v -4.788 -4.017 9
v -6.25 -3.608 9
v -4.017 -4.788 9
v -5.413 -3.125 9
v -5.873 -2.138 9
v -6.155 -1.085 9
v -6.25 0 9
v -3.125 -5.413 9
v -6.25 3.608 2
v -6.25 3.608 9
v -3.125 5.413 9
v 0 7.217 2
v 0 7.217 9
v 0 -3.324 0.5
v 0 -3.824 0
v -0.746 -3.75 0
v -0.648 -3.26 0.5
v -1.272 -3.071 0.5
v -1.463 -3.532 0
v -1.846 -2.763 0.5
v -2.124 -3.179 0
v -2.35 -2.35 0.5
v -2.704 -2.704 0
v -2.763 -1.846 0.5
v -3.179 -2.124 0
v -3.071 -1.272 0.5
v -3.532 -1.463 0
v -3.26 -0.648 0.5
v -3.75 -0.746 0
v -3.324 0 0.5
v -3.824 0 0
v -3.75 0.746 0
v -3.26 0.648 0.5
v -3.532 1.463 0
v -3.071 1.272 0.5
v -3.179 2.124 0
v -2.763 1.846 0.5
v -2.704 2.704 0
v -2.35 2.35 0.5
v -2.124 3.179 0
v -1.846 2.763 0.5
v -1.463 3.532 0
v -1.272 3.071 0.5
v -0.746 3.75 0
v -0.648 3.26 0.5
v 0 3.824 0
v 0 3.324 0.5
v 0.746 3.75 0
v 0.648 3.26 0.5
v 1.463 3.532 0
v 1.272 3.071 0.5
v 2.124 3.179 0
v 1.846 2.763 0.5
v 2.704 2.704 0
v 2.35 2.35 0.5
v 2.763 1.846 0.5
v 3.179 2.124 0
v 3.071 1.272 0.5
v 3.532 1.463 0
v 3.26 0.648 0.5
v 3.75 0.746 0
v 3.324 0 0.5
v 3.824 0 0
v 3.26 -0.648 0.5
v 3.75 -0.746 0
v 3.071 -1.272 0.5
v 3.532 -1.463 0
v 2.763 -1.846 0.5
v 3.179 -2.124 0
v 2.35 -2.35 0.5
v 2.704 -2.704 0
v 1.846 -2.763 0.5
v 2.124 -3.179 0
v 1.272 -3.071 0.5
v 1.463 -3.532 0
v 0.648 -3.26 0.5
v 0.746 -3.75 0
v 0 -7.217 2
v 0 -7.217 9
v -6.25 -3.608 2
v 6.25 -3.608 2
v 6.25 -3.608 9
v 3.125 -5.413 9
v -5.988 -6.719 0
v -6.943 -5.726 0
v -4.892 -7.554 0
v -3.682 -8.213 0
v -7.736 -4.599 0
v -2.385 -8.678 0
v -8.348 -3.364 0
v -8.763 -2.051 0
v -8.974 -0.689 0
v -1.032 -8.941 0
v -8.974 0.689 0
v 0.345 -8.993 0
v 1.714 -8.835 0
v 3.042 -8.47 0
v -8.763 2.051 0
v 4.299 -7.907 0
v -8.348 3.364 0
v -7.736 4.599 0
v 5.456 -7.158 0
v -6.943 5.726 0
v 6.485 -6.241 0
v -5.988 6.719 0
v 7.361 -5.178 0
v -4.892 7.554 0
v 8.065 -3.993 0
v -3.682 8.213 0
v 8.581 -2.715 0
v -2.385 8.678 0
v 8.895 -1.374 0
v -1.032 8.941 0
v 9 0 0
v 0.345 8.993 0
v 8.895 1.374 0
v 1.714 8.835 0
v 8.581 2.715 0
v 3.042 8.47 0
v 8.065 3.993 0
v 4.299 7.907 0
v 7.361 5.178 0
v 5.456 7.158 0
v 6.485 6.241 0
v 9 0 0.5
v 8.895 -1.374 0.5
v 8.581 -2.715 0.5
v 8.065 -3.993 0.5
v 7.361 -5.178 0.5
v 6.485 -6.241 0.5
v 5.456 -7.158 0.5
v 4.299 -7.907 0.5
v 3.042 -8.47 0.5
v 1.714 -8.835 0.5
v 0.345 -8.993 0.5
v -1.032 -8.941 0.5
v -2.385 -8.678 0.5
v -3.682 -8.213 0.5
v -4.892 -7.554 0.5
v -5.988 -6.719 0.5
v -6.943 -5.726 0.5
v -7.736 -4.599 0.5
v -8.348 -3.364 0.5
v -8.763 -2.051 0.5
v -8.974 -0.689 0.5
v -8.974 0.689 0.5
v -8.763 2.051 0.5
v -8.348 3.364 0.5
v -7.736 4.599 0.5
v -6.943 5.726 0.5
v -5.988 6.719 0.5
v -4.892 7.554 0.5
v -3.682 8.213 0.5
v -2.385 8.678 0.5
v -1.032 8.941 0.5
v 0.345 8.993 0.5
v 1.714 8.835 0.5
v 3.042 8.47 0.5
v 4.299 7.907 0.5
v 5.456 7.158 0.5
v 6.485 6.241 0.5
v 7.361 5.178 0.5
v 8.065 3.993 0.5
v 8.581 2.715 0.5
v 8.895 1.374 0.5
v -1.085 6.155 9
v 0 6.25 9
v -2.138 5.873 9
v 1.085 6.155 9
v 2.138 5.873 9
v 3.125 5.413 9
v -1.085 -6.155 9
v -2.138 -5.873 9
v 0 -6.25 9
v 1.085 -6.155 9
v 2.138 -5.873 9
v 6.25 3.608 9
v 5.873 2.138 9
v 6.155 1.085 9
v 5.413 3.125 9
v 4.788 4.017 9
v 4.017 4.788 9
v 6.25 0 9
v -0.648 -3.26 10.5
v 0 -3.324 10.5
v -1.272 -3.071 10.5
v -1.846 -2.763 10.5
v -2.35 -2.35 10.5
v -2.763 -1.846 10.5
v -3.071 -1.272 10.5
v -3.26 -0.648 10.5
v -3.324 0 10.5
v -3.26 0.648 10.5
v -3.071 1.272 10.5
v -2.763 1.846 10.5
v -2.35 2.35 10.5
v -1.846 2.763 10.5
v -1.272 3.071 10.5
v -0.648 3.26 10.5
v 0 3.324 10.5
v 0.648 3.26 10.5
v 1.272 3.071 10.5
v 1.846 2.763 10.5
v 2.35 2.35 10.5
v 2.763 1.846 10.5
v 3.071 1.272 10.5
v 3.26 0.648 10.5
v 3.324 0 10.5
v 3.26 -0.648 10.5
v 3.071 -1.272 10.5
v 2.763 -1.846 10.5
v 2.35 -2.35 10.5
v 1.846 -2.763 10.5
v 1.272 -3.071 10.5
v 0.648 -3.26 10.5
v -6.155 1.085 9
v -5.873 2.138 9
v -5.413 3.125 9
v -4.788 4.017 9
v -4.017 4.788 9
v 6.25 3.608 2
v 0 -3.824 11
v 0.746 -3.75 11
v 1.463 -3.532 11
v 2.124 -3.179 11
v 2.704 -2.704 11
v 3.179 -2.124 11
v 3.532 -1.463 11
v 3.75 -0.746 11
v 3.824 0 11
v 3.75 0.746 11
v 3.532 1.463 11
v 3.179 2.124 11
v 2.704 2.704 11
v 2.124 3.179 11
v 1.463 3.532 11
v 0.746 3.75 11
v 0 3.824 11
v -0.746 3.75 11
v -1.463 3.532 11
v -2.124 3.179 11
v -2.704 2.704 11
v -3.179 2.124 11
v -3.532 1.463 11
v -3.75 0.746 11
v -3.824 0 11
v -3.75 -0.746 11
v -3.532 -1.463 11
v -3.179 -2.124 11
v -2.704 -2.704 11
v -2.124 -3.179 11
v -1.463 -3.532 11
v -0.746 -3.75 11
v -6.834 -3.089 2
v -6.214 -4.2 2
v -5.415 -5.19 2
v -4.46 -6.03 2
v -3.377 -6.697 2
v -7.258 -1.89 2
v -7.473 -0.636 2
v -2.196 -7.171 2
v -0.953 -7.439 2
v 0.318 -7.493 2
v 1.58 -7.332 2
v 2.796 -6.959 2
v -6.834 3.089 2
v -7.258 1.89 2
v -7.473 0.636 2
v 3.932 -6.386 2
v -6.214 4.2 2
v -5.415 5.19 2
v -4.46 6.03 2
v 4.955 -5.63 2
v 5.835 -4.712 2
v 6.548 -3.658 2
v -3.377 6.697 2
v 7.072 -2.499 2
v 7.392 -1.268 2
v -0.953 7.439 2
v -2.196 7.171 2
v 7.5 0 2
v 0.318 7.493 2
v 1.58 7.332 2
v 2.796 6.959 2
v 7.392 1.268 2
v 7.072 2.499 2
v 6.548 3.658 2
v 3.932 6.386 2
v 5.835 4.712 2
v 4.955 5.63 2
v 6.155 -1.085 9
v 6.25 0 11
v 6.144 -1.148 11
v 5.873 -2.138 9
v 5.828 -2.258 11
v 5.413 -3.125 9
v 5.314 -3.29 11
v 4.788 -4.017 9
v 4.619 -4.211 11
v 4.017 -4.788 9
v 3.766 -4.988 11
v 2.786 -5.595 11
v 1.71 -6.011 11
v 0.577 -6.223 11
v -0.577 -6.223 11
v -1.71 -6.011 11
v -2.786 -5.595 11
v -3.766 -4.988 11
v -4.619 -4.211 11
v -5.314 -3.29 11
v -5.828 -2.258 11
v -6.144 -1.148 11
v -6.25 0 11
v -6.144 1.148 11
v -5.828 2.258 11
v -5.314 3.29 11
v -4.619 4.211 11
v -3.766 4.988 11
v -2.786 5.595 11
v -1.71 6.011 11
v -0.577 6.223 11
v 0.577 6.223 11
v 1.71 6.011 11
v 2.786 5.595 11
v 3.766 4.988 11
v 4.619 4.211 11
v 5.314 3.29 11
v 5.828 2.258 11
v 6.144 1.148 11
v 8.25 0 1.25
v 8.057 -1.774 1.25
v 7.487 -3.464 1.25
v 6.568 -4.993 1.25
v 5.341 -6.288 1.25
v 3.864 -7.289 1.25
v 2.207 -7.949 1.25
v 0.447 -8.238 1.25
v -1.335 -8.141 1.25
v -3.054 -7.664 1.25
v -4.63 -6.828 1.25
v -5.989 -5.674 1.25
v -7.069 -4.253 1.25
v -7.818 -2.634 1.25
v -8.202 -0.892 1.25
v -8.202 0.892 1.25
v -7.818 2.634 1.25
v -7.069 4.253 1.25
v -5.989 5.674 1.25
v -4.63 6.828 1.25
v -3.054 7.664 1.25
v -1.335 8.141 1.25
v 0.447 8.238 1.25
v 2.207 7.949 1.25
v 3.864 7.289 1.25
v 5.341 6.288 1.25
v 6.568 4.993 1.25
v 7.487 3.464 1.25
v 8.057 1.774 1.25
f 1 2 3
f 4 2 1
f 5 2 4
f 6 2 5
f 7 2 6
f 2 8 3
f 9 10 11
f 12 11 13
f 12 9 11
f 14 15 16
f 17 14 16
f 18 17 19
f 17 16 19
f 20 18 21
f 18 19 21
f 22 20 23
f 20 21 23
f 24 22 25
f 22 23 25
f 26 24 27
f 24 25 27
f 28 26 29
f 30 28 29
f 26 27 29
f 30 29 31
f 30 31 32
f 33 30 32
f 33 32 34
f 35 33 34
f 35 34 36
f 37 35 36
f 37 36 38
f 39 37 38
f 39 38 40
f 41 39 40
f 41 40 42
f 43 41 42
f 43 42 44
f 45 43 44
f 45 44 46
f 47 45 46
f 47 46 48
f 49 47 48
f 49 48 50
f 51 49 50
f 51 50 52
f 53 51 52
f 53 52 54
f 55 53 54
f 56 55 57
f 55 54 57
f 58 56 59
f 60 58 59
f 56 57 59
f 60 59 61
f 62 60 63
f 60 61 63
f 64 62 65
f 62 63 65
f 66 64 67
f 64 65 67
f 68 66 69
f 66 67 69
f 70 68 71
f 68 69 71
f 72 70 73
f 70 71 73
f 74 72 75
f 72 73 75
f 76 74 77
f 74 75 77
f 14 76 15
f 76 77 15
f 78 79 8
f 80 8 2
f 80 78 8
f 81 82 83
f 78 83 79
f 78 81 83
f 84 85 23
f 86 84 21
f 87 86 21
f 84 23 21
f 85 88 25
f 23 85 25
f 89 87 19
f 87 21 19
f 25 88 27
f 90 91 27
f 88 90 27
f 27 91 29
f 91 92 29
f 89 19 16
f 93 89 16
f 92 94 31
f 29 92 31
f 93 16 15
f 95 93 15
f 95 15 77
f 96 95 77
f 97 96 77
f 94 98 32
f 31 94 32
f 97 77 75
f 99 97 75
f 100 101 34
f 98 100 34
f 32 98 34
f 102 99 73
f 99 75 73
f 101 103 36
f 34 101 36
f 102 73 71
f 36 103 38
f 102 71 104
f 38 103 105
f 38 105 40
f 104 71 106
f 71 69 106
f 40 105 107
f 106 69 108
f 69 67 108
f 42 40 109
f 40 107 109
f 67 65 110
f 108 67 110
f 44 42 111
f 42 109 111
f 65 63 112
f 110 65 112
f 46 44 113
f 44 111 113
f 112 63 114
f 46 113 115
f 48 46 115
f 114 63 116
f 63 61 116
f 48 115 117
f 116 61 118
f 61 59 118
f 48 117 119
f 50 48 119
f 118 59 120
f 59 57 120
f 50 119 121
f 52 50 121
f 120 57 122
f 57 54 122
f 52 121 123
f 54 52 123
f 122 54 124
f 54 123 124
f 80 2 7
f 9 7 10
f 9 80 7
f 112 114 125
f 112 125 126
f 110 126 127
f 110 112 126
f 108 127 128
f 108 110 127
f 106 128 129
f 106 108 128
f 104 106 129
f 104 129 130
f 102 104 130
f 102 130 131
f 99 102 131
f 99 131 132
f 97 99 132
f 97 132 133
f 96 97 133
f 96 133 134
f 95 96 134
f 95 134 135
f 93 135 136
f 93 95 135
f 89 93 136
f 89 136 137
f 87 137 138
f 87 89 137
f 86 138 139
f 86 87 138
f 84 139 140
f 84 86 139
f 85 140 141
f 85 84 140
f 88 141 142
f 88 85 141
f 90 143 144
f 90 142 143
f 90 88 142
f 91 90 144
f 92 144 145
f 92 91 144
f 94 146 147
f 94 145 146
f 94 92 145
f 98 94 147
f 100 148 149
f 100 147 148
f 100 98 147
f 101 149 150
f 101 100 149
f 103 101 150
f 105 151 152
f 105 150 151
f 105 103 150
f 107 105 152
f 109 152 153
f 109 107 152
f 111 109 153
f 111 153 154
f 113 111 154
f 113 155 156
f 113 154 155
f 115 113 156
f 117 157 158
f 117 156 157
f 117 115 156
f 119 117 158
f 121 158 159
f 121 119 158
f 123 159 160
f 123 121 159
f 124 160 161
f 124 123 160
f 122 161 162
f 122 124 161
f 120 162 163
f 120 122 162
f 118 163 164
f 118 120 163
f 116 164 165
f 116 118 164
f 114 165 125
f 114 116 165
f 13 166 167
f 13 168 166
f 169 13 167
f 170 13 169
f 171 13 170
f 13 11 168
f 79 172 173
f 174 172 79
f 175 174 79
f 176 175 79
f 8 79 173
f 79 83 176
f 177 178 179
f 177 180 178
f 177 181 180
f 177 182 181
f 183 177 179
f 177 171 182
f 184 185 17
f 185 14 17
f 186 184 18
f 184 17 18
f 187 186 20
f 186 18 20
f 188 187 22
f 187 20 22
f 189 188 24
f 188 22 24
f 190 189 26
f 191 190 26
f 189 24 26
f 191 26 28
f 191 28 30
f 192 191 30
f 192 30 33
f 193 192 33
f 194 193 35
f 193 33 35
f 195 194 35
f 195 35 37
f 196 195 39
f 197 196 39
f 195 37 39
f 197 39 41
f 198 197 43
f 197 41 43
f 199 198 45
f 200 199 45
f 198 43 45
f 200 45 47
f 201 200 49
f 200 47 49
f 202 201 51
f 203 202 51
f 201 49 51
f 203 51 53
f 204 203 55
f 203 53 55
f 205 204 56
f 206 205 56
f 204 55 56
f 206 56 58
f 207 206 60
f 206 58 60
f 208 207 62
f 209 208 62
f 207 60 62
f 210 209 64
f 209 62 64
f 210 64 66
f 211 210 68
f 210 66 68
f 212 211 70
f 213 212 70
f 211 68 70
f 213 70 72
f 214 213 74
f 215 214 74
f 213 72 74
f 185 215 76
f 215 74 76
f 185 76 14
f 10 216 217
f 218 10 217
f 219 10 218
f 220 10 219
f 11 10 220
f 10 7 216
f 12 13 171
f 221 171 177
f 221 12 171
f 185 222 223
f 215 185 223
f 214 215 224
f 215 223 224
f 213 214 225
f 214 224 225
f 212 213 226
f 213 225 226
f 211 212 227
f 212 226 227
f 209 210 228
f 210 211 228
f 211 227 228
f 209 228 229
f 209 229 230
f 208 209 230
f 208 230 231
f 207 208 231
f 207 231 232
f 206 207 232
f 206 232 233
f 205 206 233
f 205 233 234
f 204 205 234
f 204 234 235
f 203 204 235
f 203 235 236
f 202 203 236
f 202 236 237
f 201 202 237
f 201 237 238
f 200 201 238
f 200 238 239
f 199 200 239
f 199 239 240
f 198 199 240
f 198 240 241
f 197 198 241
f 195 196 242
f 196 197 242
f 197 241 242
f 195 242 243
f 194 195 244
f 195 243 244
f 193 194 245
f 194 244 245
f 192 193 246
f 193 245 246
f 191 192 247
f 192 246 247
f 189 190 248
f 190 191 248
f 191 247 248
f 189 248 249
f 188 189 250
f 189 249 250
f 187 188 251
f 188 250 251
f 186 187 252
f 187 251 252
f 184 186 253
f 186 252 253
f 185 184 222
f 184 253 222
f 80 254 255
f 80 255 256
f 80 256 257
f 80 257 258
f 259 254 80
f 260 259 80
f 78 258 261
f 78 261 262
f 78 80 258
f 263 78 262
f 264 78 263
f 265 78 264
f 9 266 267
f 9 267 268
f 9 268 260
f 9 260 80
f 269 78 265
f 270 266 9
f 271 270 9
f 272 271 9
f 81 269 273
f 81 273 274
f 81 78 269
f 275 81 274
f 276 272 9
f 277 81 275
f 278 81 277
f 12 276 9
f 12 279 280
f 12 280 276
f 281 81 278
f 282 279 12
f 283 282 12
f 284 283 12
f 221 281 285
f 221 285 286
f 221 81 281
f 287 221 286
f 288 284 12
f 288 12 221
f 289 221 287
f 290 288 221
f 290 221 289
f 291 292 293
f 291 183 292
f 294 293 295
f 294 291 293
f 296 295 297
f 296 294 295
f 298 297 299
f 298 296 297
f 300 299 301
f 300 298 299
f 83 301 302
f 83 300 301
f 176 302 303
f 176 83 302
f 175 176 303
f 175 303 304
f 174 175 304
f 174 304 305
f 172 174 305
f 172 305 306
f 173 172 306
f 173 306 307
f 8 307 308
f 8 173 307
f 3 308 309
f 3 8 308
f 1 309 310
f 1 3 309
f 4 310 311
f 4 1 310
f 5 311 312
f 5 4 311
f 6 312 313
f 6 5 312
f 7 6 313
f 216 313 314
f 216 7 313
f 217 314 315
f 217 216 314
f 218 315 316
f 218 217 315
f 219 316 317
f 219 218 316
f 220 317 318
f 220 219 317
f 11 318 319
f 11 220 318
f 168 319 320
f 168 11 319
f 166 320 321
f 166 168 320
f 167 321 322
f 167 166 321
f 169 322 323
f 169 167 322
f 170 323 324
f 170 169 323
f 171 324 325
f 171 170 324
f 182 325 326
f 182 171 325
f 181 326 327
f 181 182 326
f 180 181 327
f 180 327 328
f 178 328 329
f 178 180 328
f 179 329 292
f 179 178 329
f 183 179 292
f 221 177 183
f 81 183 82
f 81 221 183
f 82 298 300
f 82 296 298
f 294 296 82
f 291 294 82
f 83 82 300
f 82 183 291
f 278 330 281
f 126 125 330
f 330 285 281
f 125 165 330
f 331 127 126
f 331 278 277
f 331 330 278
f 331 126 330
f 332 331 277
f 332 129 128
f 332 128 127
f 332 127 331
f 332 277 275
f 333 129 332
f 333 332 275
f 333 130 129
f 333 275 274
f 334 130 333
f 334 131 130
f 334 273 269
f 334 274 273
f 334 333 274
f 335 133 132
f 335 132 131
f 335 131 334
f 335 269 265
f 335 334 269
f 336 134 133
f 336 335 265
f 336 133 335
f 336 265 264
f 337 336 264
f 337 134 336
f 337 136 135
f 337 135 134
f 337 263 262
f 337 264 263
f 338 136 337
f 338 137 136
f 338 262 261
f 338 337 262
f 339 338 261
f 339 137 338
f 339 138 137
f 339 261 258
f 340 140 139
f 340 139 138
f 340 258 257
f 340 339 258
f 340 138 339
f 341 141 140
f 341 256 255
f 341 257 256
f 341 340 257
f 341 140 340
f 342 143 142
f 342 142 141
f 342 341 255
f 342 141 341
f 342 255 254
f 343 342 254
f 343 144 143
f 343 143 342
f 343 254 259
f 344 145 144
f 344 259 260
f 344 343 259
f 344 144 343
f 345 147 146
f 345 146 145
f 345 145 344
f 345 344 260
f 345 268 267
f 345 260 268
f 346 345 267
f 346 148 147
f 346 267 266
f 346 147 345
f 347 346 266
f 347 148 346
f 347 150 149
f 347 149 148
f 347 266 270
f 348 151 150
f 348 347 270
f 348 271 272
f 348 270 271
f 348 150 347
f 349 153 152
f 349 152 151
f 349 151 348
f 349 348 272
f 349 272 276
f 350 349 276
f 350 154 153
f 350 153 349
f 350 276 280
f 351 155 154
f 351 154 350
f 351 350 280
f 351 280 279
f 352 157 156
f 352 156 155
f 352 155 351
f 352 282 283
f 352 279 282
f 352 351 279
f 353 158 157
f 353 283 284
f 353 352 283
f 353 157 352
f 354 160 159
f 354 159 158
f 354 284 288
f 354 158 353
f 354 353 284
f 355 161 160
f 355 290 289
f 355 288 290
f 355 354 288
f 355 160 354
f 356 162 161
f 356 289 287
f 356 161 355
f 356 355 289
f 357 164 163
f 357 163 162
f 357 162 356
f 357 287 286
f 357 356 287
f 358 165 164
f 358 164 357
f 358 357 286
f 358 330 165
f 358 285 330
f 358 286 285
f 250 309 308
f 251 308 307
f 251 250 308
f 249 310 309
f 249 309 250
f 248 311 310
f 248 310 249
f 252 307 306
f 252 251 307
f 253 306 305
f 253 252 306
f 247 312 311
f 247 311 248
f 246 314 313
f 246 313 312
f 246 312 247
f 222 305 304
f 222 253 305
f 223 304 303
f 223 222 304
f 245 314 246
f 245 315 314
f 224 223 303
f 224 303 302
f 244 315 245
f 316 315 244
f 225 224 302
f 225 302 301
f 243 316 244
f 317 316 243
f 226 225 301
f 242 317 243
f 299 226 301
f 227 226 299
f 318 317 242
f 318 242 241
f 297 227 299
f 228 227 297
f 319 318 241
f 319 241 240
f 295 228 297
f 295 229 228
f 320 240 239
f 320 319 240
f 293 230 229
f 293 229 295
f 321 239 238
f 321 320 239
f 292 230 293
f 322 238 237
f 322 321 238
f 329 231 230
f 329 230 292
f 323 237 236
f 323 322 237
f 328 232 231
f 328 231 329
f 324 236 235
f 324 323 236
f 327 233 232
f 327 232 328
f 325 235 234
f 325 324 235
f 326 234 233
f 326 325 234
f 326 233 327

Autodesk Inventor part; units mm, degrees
ref_plane "YZ Plane" through (0, 0, 0) normal (1, 0, 0) x (0, 1, 0)
ref_plane "XZ Plane" through (0, 0, 0) normal (0, 1, 0) x (-1, 0, 0)
ref_plane "XY Plane" through (0, 0, 0) normal (0, 0, 1) x (1, 0, 0)
sketch "スケッチ1" plane through (0, 0, 0) normal (0, 0, 1) x (1, 0, 0)
  circle A0 centre (0, 0) radius 9
  dimension "d0" = 18
extrude "押し出し1" add sketch "スケッチ1" along normal blind 2
sketch "スケッチ2" plane through (0, 0, 2) normal (0, 0, 1) x (1, 0, 0)
  line L0 (0, 7.2169) -> (6.25, 3.6084)
  line L1 (6.25, 3.6084) -> (6.25, -3.6084)
  line L2 (6.25, -3.6084) -> (0, -7.2169)
  line L3 (0, -7.2169) -> (-6.25, -3.6084)
  line L4 (-6.25, -3.6084) -> (-6.25, 3.6084)
  line L5 (-6.25, 3.6084) -> (0, 7.2169)
  point P0 (0, 0)
  point P1 (0, 0)
  dimension "d3" = 12.5
extrude "押し出し2" add sketch "スケッチ2" along normal blind 7
sketch "スケッチ3" plane through (0, 0, 9) normal (0, 0, 1) x (1, 0, 0)
  circle A0 centre (0, 0) radius 6.25
  dimension "d6" = 12.5
extrude "押し出し3" add sketch "スケッチ3" along normal blind 2
sketch "スケッチ4" plane through (0, 0, 11) normal (0, 0, 1) x (1, 0, 0)
  point P0 (0, 0)
hole "穴1" at (0, 0, 11) direction (0, 0, -1) diameter 6.647 end through all thread size "M8x1.25" class "6H" standard "ANSI Metric M Profile"
chamfer "面取り1" distance 0.5 angle 45 2 edges at (0, 3.3235, 11) (0, 3.3235, 0)
chamfer "面取り2" distance 1.5 angle 45 1 edges at (-9, 0, 2)
properties part number "nut" material "アルミニウム 6061"
